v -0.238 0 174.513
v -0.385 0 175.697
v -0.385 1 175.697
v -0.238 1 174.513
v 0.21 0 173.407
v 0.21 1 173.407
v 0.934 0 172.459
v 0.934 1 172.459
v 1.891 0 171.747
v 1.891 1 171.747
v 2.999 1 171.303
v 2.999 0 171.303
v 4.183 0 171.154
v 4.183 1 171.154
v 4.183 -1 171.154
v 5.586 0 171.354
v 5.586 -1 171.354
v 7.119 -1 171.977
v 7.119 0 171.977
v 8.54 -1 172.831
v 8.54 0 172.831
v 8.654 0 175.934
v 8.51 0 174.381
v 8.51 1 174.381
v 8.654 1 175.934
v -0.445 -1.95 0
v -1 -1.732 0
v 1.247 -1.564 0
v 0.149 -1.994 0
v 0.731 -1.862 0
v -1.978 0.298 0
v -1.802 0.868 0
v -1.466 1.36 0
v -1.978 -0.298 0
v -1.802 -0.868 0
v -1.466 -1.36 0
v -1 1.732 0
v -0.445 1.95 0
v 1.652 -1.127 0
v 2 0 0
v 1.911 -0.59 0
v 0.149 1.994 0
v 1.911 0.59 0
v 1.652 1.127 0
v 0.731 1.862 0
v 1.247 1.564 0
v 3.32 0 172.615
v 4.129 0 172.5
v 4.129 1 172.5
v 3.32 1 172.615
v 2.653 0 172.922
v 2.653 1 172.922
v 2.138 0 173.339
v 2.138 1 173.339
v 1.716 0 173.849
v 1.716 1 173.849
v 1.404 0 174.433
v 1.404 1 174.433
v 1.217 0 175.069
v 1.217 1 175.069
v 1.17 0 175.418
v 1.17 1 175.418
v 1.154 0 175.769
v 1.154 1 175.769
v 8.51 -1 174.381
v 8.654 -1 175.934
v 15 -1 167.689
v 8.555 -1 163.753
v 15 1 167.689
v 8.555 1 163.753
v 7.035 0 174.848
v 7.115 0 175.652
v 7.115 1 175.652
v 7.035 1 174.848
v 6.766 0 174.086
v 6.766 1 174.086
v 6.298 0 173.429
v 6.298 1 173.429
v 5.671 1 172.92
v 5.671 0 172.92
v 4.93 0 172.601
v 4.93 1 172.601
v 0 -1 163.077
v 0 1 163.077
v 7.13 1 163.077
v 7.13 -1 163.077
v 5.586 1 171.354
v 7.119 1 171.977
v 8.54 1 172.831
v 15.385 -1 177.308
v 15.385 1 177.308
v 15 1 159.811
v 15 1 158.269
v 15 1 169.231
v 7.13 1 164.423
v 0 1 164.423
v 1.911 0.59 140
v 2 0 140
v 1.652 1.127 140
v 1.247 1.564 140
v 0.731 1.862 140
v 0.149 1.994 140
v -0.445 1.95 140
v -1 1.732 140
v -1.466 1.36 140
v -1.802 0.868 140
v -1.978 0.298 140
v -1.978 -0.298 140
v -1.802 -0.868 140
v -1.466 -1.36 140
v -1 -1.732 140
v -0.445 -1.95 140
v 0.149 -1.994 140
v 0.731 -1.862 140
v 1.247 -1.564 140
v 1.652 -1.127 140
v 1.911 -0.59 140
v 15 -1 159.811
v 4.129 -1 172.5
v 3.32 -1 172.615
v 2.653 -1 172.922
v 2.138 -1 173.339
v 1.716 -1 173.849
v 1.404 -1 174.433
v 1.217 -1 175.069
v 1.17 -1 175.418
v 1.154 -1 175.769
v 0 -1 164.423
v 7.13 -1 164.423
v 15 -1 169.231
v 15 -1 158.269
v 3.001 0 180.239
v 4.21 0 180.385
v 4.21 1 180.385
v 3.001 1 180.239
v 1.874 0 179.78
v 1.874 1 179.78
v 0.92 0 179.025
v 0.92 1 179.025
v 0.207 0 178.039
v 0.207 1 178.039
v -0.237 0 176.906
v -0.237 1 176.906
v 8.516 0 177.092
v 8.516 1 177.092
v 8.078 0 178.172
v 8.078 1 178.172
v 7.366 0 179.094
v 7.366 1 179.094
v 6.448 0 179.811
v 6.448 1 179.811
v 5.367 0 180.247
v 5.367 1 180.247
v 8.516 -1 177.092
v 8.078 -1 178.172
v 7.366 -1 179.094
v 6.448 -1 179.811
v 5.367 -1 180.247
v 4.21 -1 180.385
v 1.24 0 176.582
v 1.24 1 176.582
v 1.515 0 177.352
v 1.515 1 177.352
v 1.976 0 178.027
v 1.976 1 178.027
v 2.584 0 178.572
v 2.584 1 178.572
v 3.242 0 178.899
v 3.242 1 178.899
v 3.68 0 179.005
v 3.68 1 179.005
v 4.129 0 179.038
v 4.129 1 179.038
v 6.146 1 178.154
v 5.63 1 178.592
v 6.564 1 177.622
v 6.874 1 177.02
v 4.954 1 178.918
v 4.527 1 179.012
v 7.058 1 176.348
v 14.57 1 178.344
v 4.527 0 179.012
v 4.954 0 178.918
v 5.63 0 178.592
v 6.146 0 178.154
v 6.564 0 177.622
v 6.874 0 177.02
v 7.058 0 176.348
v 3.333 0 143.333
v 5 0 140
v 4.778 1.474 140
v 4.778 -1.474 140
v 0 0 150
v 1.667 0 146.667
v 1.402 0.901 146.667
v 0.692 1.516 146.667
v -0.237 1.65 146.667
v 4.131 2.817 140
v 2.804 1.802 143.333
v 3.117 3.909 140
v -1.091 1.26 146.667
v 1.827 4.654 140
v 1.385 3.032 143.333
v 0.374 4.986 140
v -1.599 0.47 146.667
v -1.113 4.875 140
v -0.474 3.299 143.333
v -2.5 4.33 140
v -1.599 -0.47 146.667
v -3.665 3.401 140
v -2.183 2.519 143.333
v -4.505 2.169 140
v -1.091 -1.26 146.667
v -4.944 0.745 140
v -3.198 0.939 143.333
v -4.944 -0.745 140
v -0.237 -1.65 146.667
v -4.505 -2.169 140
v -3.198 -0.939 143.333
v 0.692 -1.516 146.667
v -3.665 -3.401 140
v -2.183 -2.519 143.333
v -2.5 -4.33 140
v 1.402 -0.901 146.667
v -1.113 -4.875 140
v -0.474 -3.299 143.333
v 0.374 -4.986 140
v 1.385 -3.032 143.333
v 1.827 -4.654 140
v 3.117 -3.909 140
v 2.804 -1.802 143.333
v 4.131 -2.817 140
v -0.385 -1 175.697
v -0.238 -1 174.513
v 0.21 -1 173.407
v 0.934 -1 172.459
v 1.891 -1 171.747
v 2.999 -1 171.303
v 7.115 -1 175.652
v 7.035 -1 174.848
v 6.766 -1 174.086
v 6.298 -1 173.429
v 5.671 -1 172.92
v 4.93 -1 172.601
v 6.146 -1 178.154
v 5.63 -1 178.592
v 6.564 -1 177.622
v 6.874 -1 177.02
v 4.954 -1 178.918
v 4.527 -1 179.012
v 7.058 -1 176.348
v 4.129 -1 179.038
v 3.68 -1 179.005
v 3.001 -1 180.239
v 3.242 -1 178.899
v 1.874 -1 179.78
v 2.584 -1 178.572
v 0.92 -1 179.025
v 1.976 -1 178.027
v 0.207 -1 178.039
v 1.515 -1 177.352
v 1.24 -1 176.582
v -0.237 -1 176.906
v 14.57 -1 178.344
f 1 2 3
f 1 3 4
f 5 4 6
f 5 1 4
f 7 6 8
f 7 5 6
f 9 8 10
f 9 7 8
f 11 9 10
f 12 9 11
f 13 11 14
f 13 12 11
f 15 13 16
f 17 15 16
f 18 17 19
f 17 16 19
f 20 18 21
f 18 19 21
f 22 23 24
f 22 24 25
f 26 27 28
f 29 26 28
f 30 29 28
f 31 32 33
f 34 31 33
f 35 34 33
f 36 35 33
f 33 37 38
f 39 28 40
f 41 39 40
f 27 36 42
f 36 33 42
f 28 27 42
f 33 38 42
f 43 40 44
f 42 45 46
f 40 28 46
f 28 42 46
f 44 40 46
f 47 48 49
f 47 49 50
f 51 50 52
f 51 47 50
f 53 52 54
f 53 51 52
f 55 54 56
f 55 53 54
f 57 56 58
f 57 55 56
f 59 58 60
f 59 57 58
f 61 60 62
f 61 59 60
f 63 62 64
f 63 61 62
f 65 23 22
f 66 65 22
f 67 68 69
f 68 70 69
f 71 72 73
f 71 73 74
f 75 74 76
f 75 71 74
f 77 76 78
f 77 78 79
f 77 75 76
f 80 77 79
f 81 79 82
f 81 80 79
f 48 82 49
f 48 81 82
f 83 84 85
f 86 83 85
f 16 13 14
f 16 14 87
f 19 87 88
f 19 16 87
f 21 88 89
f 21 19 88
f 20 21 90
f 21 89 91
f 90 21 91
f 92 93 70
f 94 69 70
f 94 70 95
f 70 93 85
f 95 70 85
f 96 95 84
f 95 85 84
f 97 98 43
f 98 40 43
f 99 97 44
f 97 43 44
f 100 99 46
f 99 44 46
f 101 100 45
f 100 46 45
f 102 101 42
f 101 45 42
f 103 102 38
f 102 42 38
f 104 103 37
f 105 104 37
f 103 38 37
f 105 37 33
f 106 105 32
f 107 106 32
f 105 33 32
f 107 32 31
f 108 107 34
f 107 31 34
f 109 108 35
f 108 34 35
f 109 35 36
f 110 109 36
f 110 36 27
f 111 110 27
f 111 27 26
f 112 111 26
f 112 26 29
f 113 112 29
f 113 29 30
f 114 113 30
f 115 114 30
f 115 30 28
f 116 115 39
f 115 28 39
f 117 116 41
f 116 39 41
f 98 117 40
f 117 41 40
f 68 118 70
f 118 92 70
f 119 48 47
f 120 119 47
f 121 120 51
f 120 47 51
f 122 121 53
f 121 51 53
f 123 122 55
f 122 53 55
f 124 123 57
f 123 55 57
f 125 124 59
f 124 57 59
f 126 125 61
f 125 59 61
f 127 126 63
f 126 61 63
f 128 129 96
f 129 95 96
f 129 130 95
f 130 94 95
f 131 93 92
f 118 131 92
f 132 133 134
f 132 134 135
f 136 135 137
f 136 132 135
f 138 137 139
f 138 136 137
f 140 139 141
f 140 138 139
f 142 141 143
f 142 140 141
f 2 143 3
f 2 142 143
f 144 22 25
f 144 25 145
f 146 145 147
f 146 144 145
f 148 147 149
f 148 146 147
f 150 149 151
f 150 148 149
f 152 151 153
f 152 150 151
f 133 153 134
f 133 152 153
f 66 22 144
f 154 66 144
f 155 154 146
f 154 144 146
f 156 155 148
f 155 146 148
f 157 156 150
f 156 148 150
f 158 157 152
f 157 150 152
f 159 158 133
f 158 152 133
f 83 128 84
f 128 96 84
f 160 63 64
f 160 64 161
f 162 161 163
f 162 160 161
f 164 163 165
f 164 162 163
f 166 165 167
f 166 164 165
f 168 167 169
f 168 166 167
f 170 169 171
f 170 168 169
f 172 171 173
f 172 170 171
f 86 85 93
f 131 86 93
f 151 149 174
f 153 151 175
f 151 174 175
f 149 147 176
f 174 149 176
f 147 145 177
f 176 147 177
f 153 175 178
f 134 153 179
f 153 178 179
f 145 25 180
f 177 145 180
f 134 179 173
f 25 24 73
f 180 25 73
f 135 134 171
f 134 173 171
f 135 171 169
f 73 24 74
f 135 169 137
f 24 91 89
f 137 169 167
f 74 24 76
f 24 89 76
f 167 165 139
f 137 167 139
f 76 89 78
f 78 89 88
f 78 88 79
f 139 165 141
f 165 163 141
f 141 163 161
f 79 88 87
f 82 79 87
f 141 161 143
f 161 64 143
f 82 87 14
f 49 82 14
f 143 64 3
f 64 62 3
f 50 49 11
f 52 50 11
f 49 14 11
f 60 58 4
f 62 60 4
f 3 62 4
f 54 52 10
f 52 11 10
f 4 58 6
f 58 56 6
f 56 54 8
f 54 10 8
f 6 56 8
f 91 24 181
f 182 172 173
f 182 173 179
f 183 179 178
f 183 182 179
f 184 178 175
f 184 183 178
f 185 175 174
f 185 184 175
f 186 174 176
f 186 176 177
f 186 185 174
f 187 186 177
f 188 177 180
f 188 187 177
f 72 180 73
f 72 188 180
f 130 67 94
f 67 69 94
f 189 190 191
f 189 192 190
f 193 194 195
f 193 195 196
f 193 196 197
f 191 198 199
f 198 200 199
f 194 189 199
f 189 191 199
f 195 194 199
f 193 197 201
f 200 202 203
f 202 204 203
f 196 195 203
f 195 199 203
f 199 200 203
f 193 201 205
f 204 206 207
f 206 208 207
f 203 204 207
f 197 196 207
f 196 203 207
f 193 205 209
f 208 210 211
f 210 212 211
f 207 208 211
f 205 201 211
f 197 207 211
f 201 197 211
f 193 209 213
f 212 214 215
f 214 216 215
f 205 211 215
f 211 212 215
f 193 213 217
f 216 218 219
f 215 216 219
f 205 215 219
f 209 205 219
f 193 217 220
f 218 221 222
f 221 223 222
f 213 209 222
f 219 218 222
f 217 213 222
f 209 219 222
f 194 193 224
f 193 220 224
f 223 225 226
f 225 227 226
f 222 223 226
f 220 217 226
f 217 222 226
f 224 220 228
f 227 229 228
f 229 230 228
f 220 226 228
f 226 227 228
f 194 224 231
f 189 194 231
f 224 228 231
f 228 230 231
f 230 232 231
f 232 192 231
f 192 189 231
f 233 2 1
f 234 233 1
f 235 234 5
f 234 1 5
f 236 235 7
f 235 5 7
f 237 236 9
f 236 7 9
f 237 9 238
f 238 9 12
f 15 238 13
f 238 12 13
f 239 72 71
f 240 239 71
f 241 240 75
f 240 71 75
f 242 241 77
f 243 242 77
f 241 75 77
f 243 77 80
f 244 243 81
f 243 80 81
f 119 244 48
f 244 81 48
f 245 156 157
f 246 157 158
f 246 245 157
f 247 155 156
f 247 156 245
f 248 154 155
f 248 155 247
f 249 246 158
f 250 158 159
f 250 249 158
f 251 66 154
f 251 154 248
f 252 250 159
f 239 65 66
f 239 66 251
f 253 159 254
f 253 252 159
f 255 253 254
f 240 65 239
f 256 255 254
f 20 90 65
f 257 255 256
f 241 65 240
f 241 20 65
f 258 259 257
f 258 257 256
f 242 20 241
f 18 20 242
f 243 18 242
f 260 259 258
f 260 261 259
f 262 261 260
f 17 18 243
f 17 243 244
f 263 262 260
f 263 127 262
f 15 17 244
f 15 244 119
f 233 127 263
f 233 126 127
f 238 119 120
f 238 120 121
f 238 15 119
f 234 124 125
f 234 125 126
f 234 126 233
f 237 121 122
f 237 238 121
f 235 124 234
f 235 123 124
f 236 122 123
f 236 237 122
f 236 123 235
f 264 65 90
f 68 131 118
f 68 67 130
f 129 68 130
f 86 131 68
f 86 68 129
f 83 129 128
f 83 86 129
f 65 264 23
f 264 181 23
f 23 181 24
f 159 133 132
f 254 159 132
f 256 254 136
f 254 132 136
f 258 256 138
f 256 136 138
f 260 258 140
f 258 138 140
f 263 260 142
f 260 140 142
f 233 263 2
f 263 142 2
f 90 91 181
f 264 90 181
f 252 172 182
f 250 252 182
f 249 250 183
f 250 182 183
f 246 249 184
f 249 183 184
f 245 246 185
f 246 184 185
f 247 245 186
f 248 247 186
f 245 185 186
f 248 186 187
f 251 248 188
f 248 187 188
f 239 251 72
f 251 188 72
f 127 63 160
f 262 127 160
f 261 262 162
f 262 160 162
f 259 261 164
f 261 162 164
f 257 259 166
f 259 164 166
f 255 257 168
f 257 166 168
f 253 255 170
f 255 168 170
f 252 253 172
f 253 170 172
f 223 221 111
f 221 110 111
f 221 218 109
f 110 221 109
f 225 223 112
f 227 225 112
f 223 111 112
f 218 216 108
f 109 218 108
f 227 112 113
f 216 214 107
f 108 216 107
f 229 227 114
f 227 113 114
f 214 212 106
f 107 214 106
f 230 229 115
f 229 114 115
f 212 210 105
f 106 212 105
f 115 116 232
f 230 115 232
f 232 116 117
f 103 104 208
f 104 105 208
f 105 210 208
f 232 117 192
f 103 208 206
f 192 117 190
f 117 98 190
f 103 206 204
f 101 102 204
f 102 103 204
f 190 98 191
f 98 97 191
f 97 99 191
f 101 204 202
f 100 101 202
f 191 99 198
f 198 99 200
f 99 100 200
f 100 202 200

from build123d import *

# Parameters (mm, degrees)
BOSS_EXTRUDE1_DEPTH        = 1
BOSS_EXTRUDE1_DEPTH_BACK   = 1
BOSS_EXTRUDE1_2_DEPTH      = 1
BOSS_EXTRUDE1_2_DEPTH_BACK = 1


with BuildPart() as part:
    # Sketch2 → Revolve1 (revolve)
    with BuildSketch(Plane(origin=(0, 0, 0), x_dir=(1, 0, 0), z_dir=(0, 1, 0))):
        Polygon((0, -150), (5, -140), (2, -140), (2, 0), (0, 0), align=None)
    revolve(axis=Axis((0, 0, -41.949952025), (0, 0, 1)))


with BuildPart() as body_2:
    # Sketch3 → Boss-Extrude1 (new, two sides: drawn at the far end of the back side and taken through both)
    with BuildSketch(Plane(origin=(0, 0, 0), x_dir=(1, 0, 0), z_dir=(0, 1, 0)).offset(-BOSS_EXTRUDE1_DEPTH_BACK)):
        Polygon((15, -158.269230769), (15, -159.810697115), (8.5546875, -163.753004808), (15, -167.689302885), (15, -169.230769231), (7.130408654, -164.423076923), (0, -164.423076923), (0, -163.076923077), (7.130408654, -163.076923077), align=None)
    extrude(amount=BOSS_EXTRUDE1_DEPTH + BOSS_EXTRUDE1_DEPTH_BACK)


with BuildPart() as body_3:
    # Sketch3 → Boss-Extrude1 2 (new, two sides: drawn at the far end of the back side and taken through both)
    with BuildSketch(Plane(origin=(0, 0, 0), x_dir=(1, 0, 0), z_dir=(0, 1, 0)).offset(-BOSS_EXTRUDE1_2_DEPTH_BACK)):
        with BuildLine():
            Line((15.384615385, -177.307692308), (14.5703125, -178.344350962))
            Line((14.5703125, -178.344350962), (8.509615385, -174.381009615))
            add(Edge.make_bspline(
                [(8.509615385, -174.381009615), (8.551674787, -174.644882231), (8.633716408, -175.159595603), (8.64725046, -175.680592311), (8.653846154, -175.934495192)],
                knots=[0, 0, 0, 0, 1.025318673, 2, 2, 2, 2], degree=3))
            add(Edge.make_bspline(
                [(8.653846154, -175.934495192), (8.649748532, -176.086948748), (8.641682486, -176.387049036), (8.57960884, -176.827649616), (8.481786932, -177.251030771), (8.33919155, -177.65543768), (8.157038602, -178.042321888), (7.938729158, -178.413903586), (7.672990528, -178.763197915), (7.376140718, -179.094702969), (7.047353641, -179.395676243), (6.69849077, -179.662145053), (6.329915565, -179.88597416), (5.941814711, -180.067576681), (5.534786456, -180.20859759), (5.109351573, -180.311401783), (4.665216695, -180.372171466), (4.363167372, -180.380423569), (4.209735577, -180.384615385)],
                knots=[0, 0, 0, 0, 1.04369286, 2.054478336, 3.041073146, 4.015093852, 4.984733326, 5.965804835, 6.960378782, 7.985147595, 9.009457201, 10.008161701, 10.986880575, 11.956520048, 12.937015923, 13.931873656, 14.949455224, 16, 16, 16, 16], degree=3))
            add(Edge.make_bspline(
                [(4.209735577, -180.384615385), (3.999947344, -180.376787405), (3.587377155, -180.361392875), (2.983959664, -180.249327236), (2.413710712, -180.055926984), (1.874389314, -179.797180637), (1.38168706, -179.461477597), (0.936416339, -179.063651039), (0.548297495, -178.599940388), (0.215346507, -178.081326416), (-0.049182634, -177.520025038), (-0.244754428, -176.931482182), (-0.361613545, -176.320728396), (-0.376912837, -175.905942541), (-0.384615385, -175.697115385)],
                knots=[0, 0, 0, 0, 1.031881447, 2.029301251, 3.006342947, 3.987068354, 4.962916383, 5.929513747, 6.915671209, 7.928552063, 8.953527267, 9.960179832, 10.973036711, 12, 12, 12, 12], degree=3))
            add(Edge.make_bspline(
                [(-0.384615385, -175.697115385), (-0.378065948, -175.495272343), (-0.365092661, -175.095456617), (-0.249524114, -174.50731664), (-0.062208875, -173.942187268), (0.195855766, -173.40404089), (0.5218053, -172.905493801), (0.914262334, -172.459609466), (1.364553117, -172.067939213), (1.874058975, -171.74370554), (2.418030387, -171.479454216), (2.990406475, -171.293073936), (3.579667942, -171.172541322), (3.980785131, -171.160105749), (4.182692308, -171.153846154)],
                knots=[0, 0, 0, 0, 1.011913813, 2.004424092, 2.994488568, 3.992479987, 4.990471406, 5.973328987, 6.963763268, 7.974390938, 8.994854117, 9.989689954, 10.988086187, 12, 12, 12, 12], degree=3))
            add(Edge.make_bspline(
                [(4.182692308, -171.153846154), (4.337112847, -171.159282361), (4.652269778, -171.170377118), (5.130964519, -171.236589347), (5.618852651, -171.358030666), (6.032448307, -171.489456716), (6.374980445, -171.61987103), (6.645469026, -171.740794184), (6.931113653, -171.876001003), (7.226509648, -172.034482224), (7.540097115, -172.202485108), (7.860262952, -172.398731542), (8.198700605, -172.60351771), (8.424027137, -172.753538837), (8.539663462, -172.830528846)],
                knots=[0, 0, 0, 0, 1.17367173, 2.395347028, 3.66355231, 4.98980831, 5.690886799, 6.447442954, 7.240630024, 8.091733897, 8.994365608, 9.943299771, 10.944512865, 12, 12, 12, 12], degree=3))
            Line((8.539663462, -172.830528846), (15.384615385, -177.307692308))
        make_face()
        with BuildLine():
            add(Edge.make_bspline(
                [(7.115384615, -175.652043269), (7.112005971, -175.537780091), (7.105377098, -175.313596676), (7.067937177, -174.985102114), (6.996998791, -174.675042777), (6.905238355, -174.379877282), (6.780300101, -174.102682029), (6.630338776, -173.840295042), (6.452044563, -173.595319963), (6.2474054, -173.372058978), (6.026627857, -173.167050253), (5.788738619, -172.990709272), (5.54100562, -172.838431661), (5.281100468, -172.714662654), (5.009189883, -172.618273871), (4.726506574, -172.548553542), (4.431159767, -172.50975155), (4.230877582, -172.5032963), (4.128605769, -172.5)],
                knots=[0, 0, 0, 0, 1.129474985, 2.216020618, 3.260639938, 4.268601163, 5.26556745, 6.258792394, 7.250684778, 8.252748164, 9.247500881, 10.223461414, 11.174097059, 12.117127289, 13.062595836, 14.020469732, 14.98917545, 16, 16, 16, 16], degree=3))
            add(Edge.make_bspline(
                [(4.128605769, -172.5), (4.027252571, -172.502691323), (3.828514037, -172.507968607), (3.535576783, -172.555665559), (3.25393368, -172.629043276), (2.983378733, -172.73644881), (2.725387777, -172.871166755), (2.478128225, -173.03695204), (2.241429415, -173.230997521), (2.021260049, -173.456571542), (1.819315357, -173.699831255), (1.639503424, -173.957094513), (1.488509482, -174.227543319), (1.369136869, -174.512720881), (1.271367854, -174.808634489), (1.202519363, -175.117541569), (1.163606496, -175.439713542), (1.157142303, -175.657950061), (1.153846154, -175.769230769)],
                knots=[0, 0, 0, 0, 0.989642335, 1.94054129, 2.892446913, 3.828371744, 4.778262963, 5.730973156, 6.732161388, 7.763274768, 8.805796303, 9.818398792, 10.825975928, 11.825728216, 12.834635236, 13.867465554, 14.912602056, 16, 16, 16, 16], degree=3))
            add(Edge.make_bspline(
                [(1.153846154, -175.769230769), (1.157142044, -175.880511659), (1.163605731, -176.098748537), (1.202522271, -176.420917918), (1.271357182, -176.729834578), (1.369175554, -177.025713366), (1.488365973, -177.311019461), (1.640449573, -177.581705003), (1.818222088, -177.841424442), (2.02160762, -178.084524569), (2.240185355, -178.311041427), (2.48027137, -178.500541938), (2.723422593, -178.671564756), (2.984406813, -178.801108562), (3.253770808, -178.909710259), (3.535620416, -178.982717754), (3.828502614, -179.030513411), (4.027248713, -179.035777132), (4.128605769, -179.038461538)],
                knots=[0, 0, 0, 0, 1.087205562, 2.132157158, 3.164804748, 4.173533273, 5.173108684, 6.180507559, 7.20098426, 8.243321352, 9.274252308, 10.269075238, 11.227079059, 12.172305571, 13.108064818, 14.05980203, 15.010532752, 16, 16, 16, 16], degree=3))
            add(Edge.make_bspline(
                [(4.128605769, -179.038461538), (4.231022874, -179.036130628), (4.432034342, -179.031555809), (4.726240478, -178.978810058), (5.011488565, -178.907568144), (5.281352931, -178.792434681), (5.543296409, -178.655301328), (5.78983246, -178.480602445), (6.027945494, -178.2803059), (6.248869632, -178.048343065), (6.450944828, -177.795988266), (6.629310054, -177.527627329), (6.7798468, -177.246881088), (6.905448365, -176.954020743), (6.99608905, -176.645694264), (7.06746007, -176.32687848), (7.105440152, -175.993496024), (7.112027573, -175.767310558), (7.115384615, -175.652043269)],
                knots=[0, 0, 0, 0, 0.978265087, 1.920016216, 2.851775529, 3.783928695, 4.718195979, 5.674835085, 6.667117013, 7.690134047, 8.732874136, 9.755756613, 10.767227014, 11.776017537, 12.797239016, 13.836276431, 14.897336092, 16, 16, 16, 16], degree=3))
        make_face(mode=Mode.SUBTRACT)
    extrude(amount=BOSS_EXTRUDE1_2_DEPTH + BOSS_EXTRUDE1_2_DEPTH_BACK)


solid = Compound([part.part, body_2.part, body_3.part])
